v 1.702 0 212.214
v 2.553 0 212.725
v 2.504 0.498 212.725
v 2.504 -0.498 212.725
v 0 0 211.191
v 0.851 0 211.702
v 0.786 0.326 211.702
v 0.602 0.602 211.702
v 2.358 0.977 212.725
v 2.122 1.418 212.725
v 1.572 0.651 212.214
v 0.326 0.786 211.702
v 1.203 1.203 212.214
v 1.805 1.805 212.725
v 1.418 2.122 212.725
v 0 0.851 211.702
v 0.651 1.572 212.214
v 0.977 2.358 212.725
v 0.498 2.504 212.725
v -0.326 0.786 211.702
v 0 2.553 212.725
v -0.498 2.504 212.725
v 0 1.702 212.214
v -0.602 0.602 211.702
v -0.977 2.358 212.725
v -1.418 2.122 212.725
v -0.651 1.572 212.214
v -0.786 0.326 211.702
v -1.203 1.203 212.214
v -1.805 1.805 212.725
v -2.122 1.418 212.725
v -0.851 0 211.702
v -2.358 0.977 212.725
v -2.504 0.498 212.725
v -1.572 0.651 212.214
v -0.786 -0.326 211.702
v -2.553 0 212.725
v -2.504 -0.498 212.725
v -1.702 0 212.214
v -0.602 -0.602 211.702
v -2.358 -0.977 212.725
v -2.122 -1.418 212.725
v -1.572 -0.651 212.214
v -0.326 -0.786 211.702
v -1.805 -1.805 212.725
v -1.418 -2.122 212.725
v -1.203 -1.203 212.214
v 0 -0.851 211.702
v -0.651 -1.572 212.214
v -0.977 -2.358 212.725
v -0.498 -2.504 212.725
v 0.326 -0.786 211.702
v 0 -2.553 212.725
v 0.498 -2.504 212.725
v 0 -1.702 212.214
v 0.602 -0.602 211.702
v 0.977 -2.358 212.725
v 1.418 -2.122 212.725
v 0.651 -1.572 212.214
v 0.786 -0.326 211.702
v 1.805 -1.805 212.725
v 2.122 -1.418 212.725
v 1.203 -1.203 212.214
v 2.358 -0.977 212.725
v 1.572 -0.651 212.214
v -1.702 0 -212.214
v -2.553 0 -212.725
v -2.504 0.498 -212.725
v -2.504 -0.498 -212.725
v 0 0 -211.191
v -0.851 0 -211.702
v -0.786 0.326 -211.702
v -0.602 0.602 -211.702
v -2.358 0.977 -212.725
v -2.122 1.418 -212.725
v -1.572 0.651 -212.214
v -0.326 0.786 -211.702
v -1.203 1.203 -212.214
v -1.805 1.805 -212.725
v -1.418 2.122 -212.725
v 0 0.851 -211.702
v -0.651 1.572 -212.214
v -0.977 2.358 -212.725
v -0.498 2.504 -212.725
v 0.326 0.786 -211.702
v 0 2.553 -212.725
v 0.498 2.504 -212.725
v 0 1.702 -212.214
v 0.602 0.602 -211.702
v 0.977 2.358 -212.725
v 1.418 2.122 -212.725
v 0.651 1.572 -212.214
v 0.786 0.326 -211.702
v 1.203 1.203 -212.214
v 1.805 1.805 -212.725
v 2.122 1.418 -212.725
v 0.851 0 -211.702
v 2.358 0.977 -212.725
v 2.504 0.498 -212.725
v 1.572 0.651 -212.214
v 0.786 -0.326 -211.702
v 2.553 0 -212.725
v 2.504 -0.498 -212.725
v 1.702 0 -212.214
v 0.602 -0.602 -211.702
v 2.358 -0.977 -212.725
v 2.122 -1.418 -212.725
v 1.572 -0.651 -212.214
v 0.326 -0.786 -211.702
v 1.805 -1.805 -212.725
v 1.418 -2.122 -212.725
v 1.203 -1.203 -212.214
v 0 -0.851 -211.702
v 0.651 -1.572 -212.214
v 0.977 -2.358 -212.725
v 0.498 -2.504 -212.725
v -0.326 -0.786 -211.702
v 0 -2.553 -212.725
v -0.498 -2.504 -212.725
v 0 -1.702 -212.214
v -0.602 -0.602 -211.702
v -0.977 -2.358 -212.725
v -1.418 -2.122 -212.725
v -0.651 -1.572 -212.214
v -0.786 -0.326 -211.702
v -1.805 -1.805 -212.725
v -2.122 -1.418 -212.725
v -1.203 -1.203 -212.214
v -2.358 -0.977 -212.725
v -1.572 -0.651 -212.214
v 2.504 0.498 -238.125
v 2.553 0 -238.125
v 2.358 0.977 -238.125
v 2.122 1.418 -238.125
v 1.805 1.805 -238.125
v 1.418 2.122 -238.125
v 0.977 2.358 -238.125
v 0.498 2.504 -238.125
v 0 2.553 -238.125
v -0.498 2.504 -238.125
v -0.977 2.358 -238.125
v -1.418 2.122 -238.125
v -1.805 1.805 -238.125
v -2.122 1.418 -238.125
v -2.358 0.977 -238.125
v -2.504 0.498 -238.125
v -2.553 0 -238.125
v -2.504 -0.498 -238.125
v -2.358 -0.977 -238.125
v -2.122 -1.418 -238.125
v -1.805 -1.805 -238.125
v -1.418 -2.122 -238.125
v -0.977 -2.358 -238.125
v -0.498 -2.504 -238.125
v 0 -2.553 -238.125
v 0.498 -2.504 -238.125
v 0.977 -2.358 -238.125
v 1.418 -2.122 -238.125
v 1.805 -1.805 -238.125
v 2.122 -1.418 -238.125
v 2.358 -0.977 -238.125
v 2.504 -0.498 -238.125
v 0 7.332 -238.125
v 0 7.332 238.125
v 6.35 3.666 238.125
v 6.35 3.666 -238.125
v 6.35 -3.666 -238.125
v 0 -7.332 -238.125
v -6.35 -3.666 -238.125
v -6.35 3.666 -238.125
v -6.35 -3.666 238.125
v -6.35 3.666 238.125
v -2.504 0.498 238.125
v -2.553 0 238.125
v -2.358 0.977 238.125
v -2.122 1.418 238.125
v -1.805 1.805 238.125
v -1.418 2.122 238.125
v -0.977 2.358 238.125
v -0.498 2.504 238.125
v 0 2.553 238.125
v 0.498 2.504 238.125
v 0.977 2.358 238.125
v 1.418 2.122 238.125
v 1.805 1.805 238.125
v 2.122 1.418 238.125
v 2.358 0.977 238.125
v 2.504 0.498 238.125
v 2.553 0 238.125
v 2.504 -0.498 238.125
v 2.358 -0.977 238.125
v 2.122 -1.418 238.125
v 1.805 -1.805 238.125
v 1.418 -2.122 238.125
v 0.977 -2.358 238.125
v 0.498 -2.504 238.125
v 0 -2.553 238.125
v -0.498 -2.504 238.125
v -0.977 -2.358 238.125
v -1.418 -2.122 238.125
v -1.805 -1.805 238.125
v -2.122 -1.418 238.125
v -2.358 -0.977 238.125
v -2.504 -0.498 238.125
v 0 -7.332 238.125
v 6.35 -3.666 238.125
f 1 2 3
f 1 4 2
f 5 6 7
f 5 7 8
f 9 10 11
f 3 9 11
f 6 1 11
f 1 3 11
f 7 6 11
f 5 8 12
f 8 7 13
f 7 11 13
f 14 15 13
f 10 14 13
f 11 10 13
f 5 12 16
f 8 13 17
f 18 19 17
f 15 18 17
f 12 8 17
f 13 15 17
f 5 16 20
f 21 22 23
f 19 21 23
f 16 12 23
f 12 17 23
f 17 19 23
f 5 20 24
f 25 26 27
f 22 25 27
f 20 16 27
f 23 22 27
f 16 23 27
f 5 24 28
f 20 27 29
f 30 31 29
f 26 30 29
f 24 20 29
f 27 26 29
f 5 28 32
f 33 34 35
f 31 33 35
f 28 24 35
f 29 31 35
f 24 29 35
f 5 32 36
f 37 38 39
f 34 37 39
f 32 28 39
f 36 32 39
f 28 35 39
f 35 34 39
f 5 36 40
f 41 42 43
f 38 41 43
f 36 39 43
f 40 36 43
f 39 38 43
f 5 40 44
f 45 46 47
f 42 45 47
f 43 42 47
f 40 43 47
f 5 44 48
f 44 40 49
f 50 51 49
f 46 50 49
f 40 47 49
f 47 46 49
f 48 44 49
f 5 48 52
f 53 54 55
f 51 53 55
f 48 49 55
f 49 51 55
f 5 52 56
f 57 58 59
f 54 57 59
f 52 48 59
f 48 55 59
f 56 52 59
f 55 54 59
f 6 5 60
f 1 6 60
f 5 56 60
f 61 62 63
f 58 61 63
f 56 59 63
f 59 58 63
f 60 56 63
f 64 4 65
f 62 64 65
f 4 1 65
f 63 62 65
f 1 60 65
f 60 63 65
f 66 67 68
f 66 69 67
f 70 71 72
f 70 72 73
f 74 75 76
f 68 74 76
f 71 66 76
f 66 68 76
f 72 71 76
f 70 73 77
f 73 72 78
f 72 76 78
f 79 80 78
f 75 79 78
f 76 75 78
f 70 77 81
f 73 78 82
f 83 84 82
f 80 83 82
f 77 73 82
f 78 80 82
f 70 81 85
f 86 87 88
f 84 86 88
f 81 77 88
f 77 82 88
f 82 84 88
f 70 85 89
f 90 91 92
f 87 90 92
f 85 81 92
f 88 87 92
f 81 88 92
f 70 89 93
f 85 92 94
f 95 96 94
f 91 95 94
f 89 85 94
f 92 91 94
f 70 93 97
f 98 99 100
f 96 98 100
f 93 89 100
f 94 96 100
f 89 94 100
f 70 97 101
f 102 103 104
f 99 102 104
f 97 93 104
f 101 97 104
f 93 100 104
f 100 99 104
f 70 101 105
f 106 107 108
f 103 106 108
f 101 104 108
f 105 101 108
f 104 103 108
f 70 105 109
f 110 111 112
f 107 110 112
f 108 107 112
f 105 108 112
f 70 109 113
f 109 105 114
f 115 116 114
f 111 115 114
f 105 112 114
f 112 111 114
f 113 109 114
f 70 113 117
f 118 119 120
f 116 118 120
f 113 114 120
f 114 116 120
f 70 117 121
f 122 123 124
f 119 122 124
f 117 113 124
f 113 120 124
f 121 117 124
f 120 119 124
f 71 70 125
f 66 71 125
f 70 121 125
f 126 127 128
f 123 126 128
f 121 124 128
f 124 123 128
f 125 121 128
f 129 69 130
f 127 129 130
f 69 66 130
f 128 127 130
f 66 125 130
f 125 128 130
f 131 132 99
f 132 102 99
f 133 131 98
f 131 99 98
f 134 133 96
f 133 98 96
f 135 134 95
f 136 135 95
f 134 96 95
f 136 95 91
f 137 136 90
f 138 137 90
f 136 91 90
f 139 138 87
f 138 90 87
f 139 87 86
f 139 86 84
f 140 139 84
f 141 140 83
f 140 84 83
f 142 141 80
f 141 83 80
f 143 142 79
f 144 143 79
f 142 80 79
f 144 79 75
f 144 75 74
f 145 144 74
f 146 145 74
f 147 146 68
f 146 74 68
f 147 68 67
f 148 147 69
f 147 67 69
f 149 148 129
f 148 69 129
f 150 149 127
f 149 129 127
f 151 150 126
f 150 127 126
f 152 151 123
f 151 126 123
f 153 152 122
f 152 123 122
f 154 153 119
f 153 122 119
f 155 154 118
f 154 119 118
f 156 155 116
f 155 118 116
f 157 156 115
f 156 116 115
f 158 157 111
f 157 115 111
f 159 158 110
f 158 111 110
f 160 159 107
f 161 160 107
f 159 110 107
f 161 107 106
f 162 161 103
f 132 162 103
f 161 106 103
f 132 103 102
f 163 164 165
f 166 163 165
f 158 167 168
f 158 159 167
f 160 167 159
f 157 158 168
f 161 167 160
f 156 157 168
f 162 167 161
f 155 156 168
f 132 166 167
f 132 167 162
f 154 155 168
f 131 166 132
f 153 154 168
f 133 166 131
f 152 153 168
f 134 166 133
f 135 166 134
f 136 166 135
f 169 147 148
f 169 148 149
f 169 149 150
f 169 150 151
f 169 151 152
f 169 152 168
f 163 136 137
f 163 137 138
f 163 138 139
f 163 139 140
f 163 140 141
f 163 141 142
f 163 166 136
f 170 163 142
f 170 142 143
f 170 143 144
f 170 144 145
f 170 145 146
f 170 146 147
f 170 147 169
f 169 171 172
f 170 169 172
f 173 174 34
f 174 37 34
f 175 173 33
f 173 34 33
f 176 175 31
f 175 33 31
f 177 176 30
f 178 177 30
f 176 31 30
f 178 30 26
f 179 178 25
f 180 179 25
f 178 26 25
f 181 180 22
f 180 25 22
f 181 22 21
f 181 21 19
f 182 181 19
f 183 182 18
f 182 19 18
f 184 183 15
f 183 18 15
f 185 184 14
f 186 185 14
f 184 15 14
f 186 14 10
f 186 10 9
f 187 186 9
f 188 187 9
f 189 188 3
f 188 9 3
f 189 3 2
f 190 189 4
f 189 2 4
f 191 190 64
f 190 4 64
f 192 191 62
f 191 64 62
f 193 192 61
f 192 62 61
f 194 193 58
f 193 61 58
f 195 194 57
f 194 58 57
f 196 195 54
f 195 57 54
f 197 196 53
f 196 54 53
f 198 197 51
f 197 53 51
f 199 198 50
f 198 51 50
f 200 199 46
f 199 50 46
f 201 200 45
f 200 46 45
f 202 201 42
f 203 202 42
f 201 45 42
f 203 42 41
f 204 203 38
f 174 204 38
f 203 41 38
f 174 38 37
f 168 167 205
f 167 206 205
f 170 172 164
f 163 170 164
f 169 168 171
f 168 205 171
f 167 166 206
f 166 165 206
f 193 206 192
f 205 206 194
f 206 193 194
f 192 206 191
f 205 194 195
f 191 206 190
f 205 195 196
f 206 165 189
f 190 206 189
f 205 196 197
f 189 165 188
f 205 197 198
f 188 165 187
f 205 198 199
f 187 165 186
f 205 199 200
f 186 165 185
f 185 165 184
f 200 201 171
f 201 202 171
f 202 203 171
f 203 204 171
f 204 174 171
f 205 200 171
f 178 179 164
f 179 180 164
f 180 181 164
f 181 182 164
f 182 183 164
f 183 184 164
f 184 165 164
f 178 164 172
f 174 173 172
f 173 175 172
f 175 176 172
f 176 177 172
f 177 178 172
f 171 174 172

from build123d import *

# Parameters (mm, degrees)
BOSS_EXTRUDE1_DEPTH             = 238.125
TAP_DRILL_FOR_1_4_20_TAP1_D     = 5.1054
TAP_DRILL_FOR_1_4_20_TAP1_DEPTH = 25.4
TAP_DRILL_FOR_1_4_20_TAP1_TIP   = 1.533816902
TAP_DRILL_FOR_1_4_20_TAP2_D     = 5.1054
TAP_DRILL_FOR_1_4_20_TAP2_DEPTH = 25.4
TAP_DRILL_FOR_1_4_20_TAP2_TIP   = 1.533816902


with BuildPart() as part:
    # Sketch3 → Boss-Extrude1 (new, symmetric)
    with BuildSketch(Plane.XY):
        Polygon((0, 7.332348419), (6.35, 3.666174209), (6.35, -3.666174209), (0, -7.332348419), (-6.35, -3.666174209), (-6.35, 3.666174209), align=None)
    extrude(amount=BOSS_EXTRUDE1_DEPTH, both=True)

    # Tap Drill for 1/4-20 Tap1
    with Locations(Plane.XY.offset(238.125)):
        with Locations((0, 0)):
            Hole(TAP_DRILL_FOR_1_4_20_TAP1_D / 2, depth=TAP_DRILL_FOR_1_4_20_TAP1_DEPTH)
            with Locations((0, 0, -(TAP_DRILL_FOR_1_4_20_TAP1_DEPTH + TAP_DRILL_FOR_1_4_20_TAP1_TIP / 2))):  # 118° drill point
                Cone(0, TAP_DRILL_FOR_1_4_20_TAP1_D / 2, TAP_DRILL_FOR_1_4_20_TAP1_TIP, mode=Mode.SUBTRACT)

    # Tap Drill for 1/4-20 Tap2
    with Locations(Plane(origin=(0, 0, -238.125), x_dir=(-1, 0, 0), z_dir=(0, 0, -1))):
        with Locations((0, 0)):
            Hole(TAP_DRILL_FOR_1_4_20_TAP2_D / 2, depth=TAP_DRILL_FOR_1_4_20_TAP2_DEPTH)
            with Locations((0, 0, -(TAP_DRILL_FOR_1_4_20_TAP2_DEPTH + TAP_DRILL_FOR_1_4_20_TAP2_TIP / 2))):  # 118° drill point
                Cone(0, TAP_DRILL_FOR_1_4_20_TAP2_D / 2, TAP_DRILL_FOR_1_4_20_TAP2_TIP, mode=Mode.SUBTRACT)


solid = part.part
